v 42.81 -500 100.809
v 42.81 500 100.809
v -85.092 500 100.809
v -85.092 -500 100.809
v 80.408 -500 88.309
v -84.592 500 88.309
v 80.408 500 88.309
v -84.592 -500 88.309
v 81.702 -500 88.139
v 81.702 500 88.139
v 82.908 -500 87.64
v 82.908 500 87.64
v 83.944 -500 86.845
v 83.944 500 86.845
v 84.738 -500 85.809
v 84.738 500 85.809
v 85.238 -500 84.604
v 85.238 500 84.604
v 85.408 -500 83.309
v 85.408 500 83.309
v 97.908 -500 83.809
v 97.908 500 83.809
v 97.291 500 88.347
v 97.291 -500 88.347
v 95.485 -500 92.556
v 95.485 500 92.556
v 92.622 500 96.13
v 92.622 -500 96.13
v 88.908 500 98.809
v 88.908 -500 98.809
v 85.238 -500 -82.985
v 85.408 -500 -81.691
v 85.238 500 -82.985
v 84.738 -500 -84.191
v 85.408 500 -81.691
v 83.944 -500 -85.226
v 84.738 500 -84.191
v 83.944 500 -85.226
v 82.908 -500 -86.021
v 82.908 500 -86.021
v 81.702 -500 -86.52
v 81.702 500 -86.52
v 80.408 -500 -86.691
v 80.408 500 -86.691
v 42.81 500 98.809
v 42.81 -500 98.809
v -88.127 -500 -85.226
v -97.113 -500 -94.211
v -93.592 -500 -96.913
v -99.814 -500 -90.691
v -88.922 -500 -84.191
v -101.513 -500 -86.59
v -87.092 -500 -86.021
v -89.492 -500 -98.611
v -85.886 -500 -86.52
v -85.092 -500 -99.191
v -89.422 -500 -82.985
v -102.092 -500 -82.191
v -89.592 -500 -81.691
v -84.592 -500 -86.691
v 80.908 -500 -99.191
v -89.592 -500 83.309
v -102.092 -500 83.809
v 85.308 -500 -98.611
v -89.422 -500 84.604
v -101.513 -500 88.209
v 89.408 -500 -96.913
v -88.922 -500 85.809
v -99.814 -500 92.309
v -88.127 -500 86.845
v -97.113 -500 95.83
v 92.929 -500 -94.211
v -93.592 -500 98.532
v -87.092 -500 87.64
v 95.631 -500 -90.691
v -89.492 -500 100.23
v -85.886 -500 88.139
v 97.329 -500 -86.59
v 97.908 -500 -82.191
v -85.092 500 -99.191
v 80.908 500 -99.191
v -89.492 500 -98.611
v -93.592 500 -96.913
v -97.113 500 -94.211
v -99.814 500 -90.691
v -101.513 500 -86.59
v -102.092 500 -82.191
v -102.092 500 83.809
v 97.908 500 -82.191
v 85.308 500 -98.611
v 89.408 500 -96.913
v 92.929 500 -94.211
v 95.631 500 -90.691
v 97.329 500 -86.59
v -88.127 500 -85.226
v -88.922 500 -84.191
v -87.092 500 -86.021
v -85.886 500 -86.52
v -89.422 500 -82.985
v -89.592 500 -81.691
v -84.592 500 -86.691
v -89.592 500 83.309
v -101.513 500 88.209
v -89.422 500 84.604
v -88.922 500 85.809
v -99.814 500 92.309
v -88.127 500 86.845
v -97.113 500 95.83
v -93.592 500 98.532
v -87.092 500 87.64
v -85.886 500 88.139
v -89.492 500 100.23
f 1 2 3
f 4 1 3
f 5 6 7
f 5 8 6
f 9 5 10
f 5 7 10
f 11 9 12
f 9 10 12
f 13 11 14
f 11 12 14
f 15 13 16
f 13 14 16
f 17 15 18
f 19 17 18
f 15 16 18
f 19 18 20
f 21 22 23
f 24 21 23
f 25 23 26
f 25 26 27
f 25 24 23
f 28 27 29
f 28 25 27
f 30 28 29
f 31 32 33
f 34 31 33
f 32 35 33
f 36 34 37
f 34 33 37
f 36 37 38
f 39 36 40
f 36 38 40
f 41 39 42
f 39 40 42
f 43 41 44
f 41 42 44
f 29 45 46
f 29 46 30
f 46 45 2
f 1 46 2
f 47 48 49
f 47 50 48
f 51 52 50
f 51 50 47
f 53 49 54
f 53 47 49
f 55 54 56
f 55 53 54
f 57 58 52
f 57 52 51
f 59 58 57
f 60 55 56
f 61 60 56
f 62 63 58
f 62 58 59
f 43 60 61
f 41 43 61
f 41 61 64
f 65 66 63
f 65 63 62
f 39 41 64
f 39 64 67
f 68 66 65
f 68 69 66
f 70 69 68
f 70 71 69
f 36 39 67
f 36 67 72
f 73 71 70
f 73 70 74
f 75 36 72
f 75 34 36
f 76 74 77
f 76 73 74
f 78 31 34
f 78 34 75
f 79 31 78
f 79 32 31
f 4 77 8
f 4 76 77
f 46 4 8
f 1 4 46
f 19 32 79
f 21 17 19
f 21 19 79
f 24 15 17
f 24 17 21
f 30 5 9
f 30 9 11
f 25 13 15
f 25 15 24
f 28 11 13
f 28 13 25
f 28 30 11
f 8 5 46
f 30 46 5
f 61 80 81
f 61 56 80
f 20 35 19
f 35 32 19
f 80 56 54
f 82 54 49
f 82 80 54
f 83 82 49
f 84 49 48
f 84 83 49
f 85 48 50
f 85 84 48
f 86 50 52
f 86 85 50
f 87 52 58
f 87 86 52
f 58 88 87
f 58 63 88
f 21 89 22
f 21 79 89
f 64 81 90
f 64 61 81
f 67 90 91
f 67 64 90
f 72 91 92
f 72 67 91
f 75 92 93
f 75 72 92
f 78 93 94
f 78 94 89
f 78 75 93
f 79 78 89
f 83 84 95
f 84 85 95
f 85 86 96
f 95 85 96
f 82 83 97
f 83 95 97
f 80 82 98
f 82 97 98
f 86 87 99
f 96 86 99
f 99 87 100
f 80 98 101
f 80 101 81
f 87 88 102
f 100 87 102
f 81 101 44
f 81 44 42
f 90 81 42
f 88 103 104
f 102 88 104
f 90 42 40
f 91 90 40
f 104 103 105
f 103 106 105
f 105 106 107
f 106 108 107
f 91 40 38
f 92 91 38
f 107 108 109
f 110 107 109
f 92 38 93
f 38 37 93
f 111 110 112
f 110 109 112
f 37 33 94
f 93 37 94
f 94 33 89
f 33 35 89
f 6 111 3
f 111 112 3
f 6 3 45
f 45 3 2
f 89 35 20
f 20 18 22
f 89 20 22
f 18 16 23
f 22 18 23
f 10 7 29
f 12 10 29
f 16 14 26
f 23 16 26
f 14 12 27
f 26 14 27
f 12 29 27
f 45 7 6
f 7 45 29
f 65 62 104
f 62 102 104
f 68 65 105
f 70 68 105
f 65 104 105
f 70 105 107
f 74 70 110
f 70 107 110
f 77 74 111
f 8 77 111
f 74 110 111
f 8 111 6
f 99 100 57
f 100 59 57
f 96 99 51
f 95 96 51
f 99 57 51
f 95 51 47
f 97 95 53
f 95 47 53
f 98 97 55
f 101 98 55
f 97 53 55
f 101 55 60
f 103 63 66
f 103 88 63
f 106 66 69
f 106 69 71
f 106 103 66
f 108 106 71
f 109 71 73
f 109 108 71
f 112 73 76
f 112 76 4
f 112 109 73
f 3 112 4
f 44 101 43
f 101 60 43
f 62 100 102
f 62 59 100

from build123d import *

# Parameters (mm, degrees)
F0_W     = 175
F0_H     = 175
F1_DEPTH = 500
F2_R     = 5
F3_R     = 17
F4_W     = 54.523636
F4_H     = 2
F5_DEPTH = 1000


with BuildPart() as f1:
    # F0 (on Front) → F1 (new body, symmetric)
    with BuildSketch(Plane.XZ):
        Polygon((-102.091885, -11.638668), (-102.091885, -99.190576), (97.908115, -99.190576), (97.908115, 100.809424), (-102.091885, 100.809424), (-102.091885, -11.216699), align=None)
        with Locations((-2.091885, 0.809424)):
            Rectangle(F0_W, F0_H, mode=Mode.SUBTRACT)
    extrude(amount=F1_DEPTH, both=True)

    # F2
    f2_edges = [f1.edges().sort_by_distance(p)[0] for p in [
        (-89.591885, 0, -86.690576),
        (-89.591885, 0, 88.309424),
        (85.408115, 0, 88.309424),
        (85.408115, 0, -86.690576),
    ]]
    fillet(f2_edges, radius=F2_R)

    # F3
    f3_edges = [f1.edges().sort_by_distance(p)[0] for p in [
        (97.908115, 0, 100.809424),
        (-102.091885, 0, 100.809424),
        (-102.091885, 0, -99.190576),
        (97.908115, 0, -99.190576),
    ]]
    fillet(f3_edges, radius=F3_R)

    # F4 (on face) → F5 (cut, through all)
    with BuildSketch(Plane.XZ.offset(500)):
        with Locations((70.071755, 99.809424)):
            Rectangle(F4_W, F4_H)
    extrude(amount=-F5_DEPTH, mode=Mode.SUBTRACT)


solid = f1.part
